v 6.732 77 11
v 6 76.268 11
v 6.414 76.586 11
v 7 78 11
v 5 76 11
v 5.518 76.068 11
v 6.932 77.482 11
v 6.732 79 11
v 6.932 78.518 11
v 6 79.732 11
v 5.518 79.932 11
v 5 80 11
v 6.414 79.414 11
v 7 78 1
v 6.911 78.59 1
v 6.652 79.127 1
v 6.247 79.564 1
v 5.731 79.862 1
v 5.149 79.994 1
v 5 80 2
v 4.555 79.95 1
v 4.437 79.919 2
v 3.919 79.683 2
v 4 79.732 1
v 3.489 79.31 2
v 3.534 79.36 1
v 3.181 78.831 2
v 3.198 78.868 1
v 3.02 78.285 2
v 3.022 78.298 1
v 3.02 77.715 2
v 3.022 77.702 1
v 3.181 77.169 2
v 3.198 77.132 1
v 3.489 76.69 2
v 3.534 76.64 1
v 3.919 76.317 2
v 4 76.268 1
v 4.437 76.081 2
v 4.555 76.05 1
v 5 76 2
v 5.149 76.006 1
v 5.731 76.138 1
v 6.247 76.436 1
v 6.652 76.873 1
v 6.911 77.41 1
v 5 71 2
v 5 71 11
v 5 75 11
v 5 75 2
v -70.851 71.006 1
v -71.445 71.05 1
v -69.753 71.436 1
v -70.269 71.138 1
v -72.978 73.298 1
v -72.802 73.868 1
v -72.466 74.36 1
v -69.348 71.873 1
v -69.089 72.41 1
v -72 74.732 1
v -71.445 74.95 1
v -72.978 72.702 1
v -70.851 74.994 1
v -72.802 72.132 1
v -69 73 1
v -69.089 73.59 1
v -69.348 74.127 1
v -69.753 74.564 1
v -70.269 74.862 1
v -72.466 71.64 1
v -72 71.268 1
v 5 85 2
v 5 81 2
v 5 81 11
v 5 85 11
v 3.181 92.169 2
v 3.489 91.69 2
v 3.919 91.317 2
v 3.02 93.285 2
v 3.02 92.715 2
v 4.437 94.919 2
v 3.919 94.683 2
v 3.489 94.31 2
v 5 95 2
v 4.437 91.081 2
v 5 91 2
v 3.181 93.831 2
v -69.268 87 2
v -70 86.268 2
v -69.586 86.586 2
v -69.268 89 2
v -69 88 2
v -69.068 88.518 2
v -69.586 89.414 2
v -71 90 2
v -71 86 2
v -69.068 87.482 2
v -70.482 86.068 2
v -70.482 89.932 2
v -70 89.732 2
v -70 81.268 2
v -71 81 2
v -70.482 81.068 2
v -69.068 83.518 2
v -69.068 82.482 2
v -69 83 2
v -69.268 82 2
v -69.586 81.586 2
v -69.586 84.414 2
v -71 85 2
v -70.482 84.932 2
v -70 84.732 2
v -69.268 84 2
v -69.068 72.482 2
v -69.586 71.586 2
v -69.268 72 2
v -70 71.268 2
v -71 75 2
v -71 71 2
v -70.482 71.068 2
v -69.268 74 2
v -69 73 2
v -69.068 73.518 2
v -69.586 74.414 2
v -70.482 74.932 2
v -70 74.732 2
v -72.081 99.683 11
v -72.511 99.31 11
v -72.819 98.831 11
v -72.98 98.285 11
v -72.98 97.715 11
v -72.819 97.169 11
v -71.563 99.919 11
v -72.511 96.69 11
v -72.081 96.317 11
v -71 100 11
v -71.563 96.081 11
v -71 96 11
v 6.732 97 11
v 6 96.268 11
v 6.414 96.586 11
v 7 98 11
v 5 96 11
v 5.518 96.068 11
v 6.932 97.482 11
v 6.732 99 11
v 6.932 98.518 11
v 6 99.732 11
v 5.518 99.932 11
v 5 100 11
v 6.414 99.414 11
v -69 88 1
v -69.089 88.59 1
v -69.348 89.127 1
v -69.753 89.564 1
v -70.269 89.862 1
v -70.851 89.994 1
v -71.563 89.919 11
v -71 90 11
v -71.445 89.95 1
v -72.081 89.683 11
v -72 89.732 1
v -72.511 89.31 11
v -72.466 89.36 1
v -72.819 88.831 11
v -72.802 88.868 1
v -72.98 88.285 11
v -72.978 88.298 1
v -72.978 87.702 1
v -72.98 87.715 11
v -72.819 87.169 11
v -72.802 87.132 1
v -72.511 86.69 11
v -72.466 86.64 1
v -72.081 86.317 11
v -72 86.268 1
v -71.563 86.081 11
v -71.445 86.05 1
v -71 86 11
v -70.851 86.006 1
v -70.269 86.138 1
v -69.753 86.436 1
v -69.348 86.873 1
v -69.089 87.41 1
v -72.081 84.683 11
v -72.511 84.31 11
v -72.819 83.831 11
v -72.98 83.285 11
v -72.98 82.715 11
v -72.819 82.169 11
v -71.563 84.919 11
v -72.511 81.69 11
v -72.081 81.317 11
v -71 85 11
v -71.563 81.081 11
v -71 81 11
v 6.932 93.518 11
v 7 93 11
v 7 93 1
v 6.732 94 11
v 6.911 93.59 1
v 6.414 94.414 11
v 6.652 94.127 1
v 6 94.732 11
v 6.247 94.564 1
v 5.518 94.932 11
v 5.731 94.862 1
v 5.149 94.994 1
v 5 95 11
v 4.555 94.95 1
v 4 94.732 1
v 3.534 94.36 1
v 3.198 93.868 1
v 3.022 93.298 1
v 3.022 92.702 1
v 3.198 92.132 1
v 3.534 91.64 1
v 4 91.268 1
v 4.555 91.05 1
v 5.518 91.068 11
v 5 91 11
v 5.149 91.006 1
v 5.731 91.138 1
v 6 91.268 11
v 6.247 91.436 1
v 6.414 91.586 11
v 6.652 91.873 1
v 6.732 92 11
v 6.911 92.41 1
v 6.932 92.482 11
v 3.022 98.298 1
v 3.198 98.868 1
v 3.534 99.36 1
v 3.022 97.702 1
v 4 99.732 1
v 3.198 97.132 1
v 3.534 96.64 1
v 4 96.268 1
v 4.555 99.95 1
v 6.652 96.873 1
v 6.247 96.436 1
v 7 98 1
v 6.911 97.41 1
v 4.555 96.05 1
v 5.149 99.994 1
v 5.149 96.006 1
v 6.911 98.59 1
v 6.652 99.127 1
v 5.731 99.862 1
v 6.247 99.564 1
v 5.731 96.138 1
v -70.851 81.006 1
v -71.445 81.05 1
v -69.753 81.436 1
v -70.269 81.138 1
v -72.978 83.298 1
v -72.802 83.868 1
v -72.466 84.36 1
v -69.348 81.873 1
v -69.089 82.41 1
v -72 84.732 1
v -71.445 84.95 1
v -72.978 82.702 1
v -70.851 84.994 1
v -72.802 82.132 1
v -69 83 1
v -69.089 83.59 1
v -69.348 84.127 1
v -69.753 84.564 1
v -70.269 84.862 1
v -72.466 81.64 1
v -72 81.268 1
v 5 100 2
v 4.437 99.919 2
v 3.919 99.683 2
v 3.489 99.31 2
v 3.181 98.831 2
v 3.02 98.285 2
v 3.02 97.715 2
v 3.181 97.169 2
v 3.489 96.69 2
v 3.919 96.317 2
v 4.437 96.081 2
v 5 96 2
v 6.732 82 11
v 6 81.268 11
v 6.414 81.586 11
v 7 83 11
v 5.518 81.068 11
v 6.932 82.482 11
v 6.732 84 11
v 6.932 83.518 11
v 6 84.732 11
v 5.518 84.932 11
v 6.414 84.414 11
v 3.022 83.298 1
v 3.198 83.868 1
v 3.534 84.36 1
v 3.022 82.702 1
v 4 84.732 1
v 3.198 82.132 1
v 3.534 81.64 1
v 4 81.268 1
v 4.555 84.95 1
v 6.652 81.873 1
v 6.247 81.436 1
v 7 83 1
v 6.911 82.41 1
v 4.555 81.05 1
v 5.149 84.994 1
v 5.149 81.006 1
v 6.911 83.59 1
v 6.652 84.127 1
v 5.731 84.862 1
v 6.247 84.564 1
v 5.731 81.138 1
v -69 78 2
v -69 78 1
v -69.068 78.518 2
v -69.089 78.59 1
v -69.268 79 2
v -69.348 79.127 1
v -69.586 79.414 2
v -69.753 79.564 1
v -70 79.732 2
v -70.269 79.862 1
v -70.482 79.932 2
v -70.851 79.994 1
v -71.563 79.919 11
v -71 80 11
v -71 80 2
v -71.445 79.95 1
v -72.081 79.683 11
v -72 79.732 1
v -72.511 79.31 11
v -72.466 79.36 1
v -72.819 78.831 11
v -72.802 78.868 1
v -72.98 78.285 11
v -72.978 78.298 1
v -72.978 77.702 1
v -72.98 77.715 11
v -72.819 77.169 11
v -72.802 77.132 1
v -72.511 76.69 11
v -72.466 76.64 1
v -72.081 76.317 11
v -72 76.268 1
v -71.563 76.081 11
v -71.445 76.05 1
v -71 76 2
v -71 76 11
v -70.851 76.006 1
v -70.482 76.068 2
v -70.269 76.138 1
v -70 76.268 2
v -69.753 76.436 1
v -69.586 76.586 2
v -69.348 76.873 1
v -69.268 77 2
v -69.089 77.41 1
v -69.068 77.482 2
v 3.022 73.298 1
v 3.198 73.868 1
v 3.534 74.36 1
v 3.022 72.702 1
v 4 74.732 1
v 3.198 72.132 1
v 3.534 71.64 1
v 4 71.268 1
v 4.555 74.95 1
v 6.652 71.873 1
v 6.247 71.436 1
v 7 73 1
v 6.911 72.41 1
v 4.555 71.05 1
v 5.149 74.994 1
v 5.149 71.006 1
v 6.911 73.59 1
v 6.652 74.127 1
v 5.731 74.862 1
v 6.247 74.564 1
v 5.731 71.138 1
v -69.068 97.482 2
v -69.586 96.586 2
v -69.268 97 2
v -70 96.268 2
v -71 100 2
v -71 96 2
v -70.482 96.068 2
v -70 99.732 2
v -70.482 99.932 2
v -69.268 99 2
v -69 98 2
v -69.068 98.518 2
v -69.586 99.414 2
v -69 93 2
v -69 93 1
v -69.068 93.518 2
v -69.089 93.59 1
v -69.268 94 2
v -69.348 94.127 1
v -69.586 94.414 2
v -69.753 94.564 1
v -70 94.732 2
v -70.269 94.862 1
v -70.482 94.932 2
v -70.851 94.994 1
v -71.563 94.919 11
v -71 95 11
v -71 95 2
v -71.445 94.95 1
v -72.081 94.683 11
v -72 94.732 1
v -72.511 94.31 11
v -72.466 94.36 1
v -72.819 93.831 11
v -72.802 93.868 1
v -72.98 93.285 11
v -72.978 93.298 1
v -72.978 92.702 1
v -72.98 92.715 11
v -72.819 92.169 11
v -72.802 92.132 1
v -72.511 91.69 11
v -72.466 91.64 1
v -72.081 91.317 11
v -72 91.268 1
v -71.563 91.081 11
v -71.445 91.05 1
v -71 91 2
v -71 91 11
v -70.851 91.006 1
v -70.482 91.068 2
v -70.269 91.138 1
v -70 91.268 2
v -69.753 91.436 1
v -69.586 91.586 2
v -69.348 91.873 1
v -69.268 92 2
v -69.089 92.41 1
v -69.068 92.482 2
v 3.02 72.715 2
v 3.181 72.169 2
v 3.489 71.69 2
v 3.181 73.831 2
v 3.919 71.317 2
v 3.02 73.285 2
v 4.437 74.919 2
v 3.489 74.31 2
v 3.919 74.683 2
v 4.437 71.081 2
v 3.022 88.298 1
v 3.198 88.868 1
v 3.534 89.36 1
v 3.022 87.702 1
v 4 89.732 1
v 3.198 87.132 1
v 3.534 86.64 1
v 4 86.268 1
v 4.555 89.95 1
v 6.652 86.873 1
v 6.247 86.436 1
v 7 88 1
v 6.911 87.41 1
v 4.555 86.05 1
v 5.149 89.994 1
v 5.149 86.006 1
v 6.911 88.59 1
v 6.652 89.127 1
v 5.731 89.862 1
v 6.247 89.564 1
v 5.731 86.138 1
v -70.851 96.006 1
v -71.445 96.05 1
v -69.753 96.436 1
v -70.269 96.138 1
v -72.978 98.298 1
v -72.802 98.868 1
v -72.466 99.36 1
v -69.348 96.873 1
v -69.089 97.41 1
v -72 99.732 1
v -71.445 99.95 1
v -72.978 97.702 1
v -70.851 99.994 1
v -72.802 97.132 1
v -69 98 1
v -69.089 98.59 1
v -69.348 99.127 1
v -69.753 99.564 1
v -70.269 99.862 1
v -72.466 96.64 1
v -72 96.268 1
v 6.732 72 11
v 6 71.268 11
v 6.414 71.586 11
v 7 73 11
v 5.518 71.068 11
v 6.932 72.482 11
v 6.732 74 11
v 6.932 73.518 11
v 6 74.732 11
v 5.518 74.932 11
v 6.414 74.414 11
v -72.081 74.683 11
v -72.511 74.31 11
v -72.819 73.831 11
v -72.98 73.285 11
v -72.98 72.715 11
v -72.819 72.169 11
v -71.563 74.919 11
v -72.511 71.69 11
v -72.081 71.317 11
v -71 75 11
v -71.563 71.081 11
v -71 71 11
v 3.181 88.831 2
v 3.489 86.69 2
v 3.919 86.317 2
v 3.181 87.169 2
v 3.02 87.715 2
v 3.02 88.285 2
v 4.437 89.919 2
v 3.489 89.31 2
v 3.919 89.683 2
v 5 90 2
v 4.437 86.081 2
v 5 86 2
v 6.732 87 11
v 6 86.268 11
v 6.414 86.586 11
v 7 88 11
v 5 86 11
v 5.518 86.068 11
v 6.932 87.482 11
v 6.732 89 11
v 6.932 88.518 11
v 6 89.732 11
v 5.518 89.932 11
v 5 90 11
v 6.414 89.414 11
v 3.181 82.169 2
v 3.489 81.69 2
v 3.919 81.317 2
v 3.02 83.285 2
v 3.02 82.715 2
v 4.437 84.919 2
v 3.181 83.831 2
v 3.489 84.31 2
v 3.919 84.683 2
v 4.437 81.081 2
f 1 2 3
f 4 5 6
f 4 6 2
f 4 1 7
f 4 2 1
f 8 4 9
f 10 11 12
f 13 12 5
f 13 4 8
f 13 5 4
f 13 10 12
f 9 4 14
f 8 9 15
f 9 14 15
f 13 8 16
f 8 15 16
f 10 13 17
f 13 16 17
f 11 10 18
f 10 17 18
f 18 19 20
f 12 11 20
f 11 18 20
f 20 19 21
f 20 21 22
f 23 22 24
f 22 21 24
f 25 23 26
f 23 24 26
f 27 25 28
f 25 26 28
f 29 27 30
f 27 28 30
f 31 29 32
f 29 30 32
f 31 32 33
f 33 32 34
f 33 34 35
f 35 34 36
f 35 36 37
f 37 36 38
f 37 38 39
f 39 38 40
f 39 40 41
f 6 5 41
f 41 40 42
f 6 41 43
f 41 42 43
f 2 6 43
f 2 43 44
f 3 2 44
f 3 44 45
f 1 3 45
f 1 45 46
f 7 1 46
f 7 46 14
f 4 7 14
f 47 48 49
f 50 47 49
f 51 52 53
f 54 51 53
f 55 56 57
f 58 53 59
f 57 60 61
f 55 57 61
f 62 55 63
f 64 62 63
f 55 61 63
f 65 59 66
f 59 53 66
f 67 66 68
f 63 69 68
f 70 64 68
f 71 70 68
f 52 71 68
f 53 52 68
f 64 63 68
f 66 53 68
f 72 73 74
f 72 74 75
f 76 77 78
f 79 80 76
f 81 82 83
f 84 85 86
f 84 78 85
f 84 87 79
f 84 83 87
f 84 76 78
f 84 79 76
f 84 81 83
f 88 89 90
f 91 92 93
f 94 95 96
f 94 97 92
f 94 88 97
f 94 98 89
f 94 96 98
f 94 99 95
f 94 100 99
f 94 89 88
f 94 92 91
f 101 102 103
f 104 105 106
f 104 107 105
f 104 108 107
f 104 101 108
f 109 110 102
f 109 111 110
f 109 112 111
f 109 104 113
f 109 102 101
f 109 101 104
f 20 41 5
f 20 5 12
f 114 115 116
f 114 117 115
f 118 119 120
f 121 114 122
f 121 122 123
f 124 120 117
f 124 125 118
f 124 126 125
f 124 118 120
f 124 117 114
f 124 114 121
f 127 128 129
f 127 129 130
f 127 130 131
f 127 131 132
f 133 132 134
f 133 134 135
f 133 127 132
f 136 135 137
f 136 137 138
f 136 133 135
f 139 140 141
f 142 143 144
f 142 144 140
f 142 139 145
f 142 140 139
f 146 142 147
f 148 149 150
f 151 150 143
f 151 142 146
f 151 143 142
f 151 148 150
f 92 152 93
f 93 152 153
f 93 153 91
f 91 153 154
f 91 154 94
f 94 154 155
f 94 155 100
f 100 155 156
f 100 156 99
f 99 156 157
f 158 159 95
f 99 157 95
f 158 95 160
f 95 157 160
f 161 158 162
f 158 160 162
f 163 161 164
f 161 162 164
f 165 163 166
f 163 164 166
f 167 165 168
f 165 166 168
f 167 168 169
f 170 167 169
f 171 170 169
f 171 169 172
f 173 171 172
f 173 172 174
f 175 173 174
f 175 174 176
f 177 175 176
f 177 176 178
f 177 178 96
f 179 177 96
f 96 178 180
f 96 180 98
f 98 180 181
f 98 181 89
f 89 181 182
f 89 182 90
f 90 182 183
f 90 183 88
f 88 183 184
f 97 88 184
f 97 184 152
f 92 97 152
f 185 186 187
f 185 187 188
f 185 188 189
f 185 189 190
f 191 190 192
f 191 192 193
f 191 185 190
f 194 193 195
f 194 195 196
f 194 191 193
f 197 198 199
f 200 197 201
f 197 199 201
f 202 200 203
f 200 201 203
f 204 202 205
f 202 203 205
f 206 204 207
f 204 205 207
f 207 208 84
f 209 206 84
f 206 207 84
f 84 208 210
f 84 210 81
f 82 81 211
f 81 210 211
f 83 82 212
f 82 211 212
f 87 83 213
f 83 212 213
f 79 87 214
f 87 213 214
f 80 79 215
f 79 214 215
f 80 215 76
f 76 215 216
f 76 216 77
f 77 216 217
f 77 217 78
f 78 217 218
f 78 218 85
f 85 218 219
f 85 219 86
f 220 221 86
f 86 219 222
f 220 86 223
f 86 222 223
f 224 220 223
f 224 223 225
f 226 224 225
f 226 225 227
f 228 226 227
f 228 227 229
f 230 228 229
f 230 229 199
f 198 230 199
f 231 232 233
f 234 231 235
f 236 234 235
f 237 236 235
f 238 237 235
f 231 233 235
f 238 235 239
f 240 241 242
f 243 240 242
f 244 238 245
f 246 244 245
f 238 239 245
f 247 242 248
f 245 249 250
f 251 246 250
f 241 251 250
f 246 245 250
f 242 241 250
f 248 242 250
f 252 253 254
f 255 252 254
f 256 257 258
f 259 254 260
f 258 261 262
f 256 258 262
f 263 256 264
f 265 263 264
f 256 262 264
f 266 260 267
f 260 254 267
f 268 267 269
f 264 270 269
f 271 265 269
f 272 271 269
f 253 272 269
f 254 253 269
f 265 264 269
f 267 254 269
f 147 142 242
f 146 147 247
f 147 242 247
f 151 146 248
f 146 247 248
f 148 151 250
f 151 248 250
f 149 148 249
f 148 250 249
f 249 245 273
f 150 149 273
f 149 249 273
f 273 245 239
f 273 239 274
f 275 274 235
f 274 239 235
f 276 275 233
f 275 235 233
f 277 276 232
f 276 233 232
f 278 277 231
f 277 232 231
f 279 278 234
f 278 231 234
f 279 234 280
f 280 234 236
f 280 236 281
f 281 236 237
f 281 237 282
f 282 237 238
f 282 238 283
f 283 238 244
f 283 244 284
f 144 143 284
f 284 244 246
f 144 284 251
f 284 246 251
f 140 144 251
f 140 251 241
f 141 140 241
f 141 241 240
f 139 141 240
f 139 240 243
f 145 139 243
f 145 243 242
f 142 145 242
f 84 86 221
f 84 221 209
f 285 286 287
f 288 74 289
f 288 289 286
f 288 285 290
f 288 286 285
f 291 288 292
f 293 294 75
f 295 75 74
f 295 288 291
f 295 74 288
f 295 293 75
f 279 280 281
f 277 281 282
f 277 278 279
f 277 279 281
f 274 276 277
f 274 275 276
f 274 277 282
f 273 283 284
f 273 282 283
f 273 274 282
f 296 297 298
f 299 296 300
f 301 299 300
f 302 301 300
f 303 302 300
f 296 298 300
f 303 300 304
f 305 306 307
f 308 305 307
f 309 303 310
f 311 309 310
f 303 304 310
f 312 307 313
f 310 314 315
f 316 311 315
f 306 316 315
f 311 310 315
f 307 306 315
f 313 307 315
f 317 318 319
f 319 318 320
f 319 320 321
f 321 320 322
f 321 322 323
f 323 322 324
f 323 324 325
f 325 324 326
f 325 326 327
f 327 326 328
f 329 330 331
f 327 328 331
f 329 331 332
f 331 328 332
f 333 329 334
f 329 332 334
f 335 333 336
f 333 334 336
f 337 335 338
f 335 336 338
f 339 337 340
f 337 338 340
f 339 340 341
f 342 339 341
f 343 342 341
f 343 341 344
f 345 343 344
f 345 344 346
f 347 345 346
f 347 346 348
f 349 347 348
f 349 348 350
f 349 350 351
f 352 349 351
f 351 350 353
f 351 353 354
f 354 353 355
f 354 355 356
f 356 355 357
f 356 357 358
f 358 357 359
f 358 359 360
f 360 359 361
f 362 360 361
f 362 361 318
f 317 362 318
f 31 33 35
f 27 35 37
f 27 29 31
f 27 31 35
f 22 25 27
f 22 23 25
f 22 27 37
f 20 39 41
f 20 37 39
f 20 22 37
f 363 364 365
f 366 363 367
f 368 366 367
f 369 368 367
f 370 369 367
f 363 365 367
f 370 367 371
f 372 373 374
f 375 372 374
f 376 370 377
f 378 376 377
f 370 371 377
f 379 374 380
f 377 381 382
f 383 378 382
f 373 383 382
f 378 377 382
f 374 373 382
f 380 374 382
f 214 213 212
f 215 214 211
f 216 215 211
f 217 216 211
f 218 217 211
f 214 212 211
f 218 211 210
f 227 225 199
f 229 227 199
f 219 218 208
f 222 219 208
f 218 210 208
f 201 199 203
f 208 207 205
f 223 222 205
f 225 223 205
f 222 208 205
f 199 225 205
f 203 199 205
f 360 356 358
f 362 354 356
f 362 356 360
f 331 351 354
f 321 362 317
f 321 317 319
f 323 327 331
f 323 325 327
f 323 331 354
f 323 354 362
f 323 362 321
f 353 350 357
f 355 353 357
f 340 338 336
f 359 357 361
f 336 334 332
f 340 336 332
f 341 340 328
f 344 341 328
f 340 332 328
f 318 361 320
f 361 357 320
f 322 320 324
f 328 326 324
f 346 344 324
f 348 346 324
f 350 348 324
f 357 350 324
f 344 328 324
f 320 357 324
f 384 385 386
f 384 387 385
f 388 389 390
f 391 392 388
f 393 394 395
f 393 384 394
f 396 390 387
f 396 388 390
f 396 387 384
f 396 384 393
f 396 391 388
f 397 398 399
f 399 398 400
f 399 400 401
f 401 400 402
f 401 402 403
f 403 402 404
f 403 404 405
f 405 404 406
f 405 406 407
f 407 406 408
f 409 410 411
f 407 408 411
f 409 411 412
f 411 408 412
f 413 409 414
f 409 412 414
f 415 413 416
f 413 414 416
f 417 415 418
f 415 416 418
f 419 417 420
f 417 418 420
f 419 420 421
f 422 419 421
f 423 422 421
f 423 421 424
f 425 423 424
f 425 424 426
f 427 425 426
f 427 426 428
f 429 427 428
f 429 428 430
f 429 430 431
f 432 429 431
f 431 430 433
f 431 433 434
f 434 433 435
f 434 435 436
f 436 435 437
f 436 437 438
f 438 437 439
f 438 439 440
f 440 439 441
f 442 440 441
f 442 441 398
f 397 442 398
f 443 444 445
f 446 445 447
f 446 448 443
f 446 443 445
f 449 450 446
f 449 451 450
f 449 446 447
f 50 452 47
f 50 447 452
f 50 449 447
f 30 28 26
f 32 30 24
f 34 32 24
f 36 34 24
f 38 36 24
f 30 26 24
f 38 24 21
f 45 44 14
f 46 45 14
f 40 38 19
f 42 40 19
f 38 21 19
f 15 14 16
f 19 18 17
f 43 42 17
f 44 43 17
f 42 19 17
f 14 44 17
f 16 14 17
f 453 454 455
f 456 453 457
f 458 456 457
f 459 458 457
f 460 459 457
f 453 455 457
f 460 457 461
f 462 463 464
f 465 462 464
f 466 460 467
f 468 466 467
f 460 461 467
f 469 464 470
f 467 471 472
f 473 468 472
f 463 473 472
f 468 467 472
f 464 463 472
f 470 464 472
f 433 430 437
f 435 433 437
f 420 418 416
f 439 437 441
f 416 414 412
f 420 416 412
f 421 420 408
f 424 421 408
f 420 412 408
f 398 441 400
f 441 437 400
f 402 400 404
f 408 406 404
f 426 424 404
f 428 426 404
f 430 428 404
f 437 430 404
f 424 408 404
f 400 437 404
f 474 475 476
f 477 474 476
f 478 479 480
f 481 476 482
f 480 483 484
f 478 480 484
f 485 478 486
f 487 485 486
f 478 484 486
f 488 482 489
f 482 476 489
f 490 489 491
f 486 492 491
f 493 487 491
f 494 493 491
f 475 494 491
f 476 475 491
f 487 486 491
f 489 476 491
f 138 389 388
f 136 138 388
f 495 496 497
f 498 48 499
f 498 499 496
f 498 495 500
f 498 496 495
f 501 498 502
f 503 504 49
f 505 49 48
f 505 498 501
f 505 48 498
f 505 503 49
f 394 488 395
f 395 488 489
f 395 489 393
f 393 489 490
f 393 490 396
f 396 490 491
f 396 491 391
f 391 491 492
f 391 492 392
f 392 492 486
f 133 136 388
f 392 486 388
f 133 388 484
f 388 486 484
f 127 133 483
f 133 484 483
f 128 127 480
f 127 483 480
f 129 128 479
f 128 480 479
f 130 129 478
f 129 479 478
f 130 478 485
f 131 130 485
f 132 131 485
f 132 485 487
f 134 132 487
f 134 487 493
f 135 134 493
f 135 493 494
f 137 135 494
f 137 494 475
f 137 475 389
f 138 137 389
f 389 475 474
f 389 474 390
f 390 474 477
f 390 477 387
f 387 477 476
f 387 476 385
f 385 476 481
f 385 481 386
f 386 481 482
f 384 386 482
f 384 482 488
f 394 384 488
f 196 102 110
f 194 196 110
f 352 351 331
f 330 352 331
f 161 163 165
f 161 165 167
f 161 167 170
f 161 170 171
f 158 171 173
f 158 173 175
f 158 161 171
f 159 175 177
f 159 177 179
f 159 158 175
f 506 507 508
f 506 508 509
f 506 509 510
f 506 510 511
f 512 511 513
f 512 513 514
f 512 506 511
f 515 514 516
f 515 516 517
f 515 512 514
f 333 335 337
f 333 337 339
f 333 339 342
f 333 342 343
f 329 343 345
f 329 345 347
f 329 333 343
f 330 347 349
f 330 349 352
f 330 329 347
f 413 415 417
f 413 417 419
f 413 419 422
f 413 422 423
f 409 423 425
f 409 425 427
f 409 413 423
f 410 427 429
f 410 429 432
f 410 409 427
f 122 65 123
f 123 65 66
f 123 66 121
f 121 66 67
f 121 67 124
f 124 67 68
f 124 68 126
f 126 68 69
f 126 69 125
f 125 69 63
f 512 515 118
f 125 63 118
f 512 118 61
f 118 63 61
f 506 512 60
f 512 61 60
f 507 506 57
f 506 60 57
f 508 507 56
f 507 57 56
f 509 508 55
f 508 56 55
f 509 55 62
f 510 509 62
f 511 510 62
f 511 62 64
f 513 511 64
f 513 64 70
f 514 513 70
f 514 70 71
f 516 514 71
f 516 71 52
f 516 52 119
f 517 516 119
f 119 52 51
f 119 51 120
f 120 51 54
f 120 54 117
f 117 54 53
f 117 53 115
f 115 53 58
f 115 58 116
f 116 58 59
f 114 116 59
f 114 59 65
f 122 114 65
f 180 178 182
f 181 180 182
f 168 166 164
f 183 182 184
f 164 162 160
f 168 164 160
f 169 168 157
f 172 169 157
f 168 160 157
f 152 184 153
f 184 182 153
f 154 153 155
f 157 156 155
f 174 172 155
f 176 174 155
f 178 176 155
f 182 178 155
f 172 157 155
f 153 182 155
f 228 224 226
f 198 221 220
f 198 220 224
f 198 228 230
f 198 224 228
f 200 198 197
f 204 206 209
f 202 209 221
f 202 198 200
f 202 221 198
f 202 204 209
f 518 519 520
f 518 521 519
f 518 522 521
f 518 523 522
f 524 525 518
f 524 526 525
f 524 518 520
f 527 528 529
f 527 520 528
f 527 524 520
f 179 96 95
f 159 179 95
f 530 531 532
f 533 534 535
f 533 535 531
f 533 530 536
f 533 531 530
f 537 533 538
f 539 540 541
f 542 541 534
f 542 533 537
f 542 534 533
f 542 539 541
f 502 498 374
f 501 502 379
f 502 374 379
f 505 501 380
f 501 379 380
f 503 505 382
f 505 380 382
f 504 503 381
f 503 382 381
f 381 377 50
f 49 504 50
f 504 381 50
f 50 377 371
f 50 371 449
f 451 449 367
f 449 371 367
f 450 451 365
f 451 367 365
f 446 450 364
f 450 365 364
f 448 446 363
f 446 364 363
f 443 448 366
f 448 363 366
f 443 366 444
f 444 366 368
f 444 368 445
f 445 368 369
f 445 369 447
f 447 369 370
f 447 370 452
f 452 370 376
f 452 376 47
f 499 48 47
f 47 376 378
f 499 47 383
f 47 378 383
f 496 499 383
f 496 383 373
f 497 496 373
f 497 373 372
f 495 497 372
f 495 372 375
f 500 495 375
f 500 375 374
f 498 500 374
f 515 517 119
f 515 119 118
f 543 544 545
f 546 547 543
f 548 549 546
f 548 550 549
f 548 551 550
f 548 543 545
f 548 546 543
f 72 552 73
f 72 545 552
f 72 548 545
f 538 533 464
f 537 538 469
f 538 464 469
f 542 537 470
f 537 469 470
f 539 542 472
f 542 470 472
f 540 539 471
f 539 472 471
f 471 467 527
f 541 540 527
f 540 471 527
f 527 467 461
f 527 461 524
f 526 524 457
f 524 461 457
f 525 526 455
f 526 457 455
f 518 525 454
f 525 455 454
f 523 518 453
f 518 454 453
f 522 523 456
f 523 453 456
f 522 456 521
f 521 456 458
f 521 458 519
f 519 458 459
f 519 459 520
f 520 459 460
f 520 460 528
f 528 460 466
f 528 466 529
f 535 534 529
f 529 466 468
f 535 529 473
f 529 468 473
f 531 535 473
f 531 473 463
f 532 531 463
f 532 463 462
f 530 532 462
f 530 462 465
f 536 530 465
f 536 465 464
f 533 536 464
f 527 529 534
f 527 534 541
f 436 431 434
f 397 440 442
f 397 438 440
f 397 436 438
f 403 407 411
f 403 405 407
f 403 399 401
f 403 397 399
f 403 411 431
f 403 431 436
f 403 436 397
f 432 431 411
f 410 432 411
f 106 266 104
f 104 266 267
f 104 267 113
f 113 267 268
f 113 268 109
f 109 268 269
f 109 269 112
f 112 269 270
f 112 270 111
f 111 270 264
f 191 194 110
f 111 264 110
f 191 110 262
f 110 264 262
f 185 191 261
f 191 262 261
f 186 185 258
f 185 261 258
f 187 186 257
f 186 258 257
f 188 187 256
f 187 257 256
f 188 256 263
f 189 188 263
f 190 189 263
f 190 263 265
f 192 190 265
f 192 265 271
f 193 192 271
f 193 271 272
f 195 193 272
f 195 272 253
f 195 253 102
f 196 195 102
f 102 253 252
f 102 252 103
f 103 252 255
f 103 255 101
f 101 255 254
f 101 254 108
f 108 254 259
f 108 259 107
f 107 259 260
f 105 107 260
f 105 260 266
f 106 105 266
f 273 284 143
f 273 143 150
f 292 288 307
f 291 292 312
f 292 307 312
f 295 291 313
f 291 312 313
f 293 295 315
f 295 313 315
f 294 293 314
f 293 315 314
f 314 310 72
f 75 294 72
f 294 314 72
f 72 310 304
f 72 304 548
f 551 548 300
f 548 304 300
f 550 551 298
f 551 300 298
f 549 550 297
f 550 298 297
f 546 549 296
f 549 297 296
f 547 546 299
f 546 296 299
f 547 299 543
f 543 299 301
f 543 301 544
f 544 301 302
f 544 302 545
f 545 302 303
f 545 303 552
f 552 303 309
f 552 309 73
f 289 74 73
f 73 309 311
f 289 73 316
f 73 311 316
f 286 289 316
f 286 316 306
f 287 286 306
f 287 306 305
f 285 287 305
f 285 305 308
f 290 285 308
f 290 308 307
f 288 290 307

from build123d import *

# Parameters (mm, degrees)
BOX003_W          = 5
BOX003_H          = 35
BOX003_DEPTH      = 12
BOX002_W          = 5
BOX002_H          = 35
BOX002_DEPTH      = 12
CYLINDER013_R     = 2
CYLINDER013_DEPTH = 10
CYLINDER014_R     = 2
CYLINDER014_DEPTH = 10
CYLINDER015_R     = 2
CYLINDER015_DEPTH = 10
CYLINDER016_R     = 2
CYLINDER016_DEPTH = 10
CYLINDER017_R     = 2
CYLINDER017_DEPTH = 10
CYLINDER012_R     = 2
CYLINDER012_DEPTH = 10
CYLINDER007_R     = 2
CYLINDER007_DEPTH = 10
CYLINDER008_R     = 2
CYLINDER008_DEPTH = 10
CYLINDER009_R     = 2
CYLINDER009_DEPTH = 10
CYLINDER010_R     = 2
CYLINDER010_DEPTH = 10
CYLINDER011_R     = 2
CYLINDER011_DEPTH = 10
CYLINDER006_R     = 2
CYLINDER006_DEPTH = 10


with BuildPart() as cubo003:
    # Box003 → Box003 (new body)
    with BuildSketch(Plane(origin=(-71, 69, 2), x_dir=(1, 0, 0), z_dir=(0, 0, 1))):
        with Locations((2.5, 17.5)):
            Rectangle(BOX003_W, BOX003_H)
    extrude(amount=BOX003_DEPTH)


with BuildPart() as cubo002:
    # Box002 → Box002 (new body)
    with BuildSketch(Plane(origin=(0, 69, 2), x_dir=(1, 0, 0), z_dir=(0, 0, 1))):
        with Locations((2.5, 17.5)):
            Rectangle(BOX002_W, BOX002_H)
    extrude(amount=BOX002_DEPTH)


with BuildPart() as cilindro013:
    # Cylinder013 → Cylinder013 (new body)
    with BuildSketch(Plane(origin=(5, 73, 1), x_dir=(1, 0, 0), z_dir=(0, 0, 1))):
        Circle(CYLINDER013_R)
    extrude(amount=CYLINDER013_DEPTH)


with BuildPart() as cilindro014:
    # Cylinder014 → Cylinder014 (new body)
    with BuildSketch(Plane(origin=(5, 83, 1), x_dir=(1, 0, 0), z_dir=(0, 0, 1))):
        Circle(CYLINDER014_R)
    extrude(amount=CYLINDER014_DEPTH)


with BuildPart() as cilindro015:
    # Cylinder015 → Cylinder015 (new body)
    with BuildSketch(Plane(origin=(5, 88, 1), x_dir=(1, 0, 0), z_dir=(0, 0, 1))):
        Circle(CYLINDER015_R)
    extrude(amount=CYLINDER015_DEPTH)


with BuildPart() as cilindro016:
    # Cylinder016 → Cylinder016 (new body)
    with BuildSketch(Plane(origin=(5, 93, 1), x_dir=(1, 0, 0), z_dir=(0, 0, 1))):
        Circle(CYLINDER016_R)
    extrude(amount=CYLINDER016_DEPTH)


with BuildPart() as cilindro017:
    # Cylinder017 → Cylinder017 (new body)
    with BuildSketch(Plane(origin=(5, 98, 1), x_dir=(1, 0, 0), z_dir=(0, 0, 1))):
        Circle(CYLINDER017_R)
    extrude(amount=CYLINDER017_DEPTH)


with BuildPart() as cil_sx:
    # Cylinder012 → Cylinder012 (new body)
    with BuildSketch(Plane(origin=(5, 78, 1), x_dir=(1, 0, 0), z_dir=(0, 0, 1))):
        Circle(CYLINDER012_R)
    extrude(amount=CYLINDER012_DEPTH)

    # Fusion010: union Cilindro013, Cilindro014, Cilindro015, Cilindro016, Cilindro017
    add(cilindro013.part)
    add(cilindro014.part)
    add(cilindro015.part)
    add(cilindro016.part)
    add(cilindro017.part)


with BuildPart() as cil_sx_1:
    # Fusion010 placement: moved
    add(cil_sx.part.moved(Location((-76, 0, 0))))


with BuildPart() as cilindro007:
    # Cylinder007 → Cylinder007 (new body)
    with BuildSketch(Plane(origin=(5, 73, 1), x_dir=(1, 0, 0), z_dir=(0, 0, 1))):
        Circle(CYLINDER007_R)
    extrude(amount=CYLINDER007_DEPTH)


with BuildPart() as cilindro008:
    # Cylinder008 → Cylinder008 (new body)
    with BuildSketch(Plane(origin=(5, 83, 1), x_dir=(1, 0, 0), z_dir=(0, 0, 1))):
        Circle(CYLINDER008_R)
    extrude(amount=CYLINDER008_DEPTH)


with BuildPart() as cilindro009:
    # Cylinder009 → Cylinder009 (new body)
    with BuildSketch(Plane(origin=(5, 88, 1), x_dir=(1, 0, 0), z_dir=(0, 0, 1))):
        Circle(CYLINDER009_R)
    extrude(amount=CYLINDER009_DEPTH)


with BuildPart() as cilindro010:
    # Cylinder010 → Cylinder010 (new body)
    with BuildSketch(Plane(origin=(5, 93, 1), x_dir=(1, 0, 0), z_dir=(0, 0, 1))):
        Circle(CYLINDER010_R)
    extrude(amount=CYLINDER010_DEPTH)


with BuildPart() as cilindro011:
    # Cylinder011 → Cylinder011 (new body)
    with BuildSketch(Plane(origin=(5, 98, 1), x_dir=(1, 0, 0), z_dir=(0, 0, 1))):
        Circle(CYLINDER011_R)
    extrude(amount=CYLINDER011_DEPTH)


with BuildPart() as final:
    # Cylinder006 → Cylinder006 (new body)
    with BuildSketch(Plane(origin=(5, 78, 1), x_dir=(1, 0, 0), z_dir=(0, 0, 1))):
        Circle(CYLINDER006_R)
    extrude(amount=CYLINDER006_DEPTH)

    # Fusion009: union Cilindro007, Cilindro008, Cilindro009, Cilindro010, Cilindro011
    add(cilindro007.part)
    add(cilindro008.part)
    add(cilindro009.part)
    add(cilindro010.part)
    add(cilindro011.part)

    # Fusion011: union cil_sx
    add(cil_sx_1.part)

    # Cut014: cut Cubo002
    add(cubo002.part, mode=Mode.SUBTRACT)

    # Cut015: cut Cubo003
    add(cubo003.part, mode=Mode.SUBTRACT)


solid = final.part
